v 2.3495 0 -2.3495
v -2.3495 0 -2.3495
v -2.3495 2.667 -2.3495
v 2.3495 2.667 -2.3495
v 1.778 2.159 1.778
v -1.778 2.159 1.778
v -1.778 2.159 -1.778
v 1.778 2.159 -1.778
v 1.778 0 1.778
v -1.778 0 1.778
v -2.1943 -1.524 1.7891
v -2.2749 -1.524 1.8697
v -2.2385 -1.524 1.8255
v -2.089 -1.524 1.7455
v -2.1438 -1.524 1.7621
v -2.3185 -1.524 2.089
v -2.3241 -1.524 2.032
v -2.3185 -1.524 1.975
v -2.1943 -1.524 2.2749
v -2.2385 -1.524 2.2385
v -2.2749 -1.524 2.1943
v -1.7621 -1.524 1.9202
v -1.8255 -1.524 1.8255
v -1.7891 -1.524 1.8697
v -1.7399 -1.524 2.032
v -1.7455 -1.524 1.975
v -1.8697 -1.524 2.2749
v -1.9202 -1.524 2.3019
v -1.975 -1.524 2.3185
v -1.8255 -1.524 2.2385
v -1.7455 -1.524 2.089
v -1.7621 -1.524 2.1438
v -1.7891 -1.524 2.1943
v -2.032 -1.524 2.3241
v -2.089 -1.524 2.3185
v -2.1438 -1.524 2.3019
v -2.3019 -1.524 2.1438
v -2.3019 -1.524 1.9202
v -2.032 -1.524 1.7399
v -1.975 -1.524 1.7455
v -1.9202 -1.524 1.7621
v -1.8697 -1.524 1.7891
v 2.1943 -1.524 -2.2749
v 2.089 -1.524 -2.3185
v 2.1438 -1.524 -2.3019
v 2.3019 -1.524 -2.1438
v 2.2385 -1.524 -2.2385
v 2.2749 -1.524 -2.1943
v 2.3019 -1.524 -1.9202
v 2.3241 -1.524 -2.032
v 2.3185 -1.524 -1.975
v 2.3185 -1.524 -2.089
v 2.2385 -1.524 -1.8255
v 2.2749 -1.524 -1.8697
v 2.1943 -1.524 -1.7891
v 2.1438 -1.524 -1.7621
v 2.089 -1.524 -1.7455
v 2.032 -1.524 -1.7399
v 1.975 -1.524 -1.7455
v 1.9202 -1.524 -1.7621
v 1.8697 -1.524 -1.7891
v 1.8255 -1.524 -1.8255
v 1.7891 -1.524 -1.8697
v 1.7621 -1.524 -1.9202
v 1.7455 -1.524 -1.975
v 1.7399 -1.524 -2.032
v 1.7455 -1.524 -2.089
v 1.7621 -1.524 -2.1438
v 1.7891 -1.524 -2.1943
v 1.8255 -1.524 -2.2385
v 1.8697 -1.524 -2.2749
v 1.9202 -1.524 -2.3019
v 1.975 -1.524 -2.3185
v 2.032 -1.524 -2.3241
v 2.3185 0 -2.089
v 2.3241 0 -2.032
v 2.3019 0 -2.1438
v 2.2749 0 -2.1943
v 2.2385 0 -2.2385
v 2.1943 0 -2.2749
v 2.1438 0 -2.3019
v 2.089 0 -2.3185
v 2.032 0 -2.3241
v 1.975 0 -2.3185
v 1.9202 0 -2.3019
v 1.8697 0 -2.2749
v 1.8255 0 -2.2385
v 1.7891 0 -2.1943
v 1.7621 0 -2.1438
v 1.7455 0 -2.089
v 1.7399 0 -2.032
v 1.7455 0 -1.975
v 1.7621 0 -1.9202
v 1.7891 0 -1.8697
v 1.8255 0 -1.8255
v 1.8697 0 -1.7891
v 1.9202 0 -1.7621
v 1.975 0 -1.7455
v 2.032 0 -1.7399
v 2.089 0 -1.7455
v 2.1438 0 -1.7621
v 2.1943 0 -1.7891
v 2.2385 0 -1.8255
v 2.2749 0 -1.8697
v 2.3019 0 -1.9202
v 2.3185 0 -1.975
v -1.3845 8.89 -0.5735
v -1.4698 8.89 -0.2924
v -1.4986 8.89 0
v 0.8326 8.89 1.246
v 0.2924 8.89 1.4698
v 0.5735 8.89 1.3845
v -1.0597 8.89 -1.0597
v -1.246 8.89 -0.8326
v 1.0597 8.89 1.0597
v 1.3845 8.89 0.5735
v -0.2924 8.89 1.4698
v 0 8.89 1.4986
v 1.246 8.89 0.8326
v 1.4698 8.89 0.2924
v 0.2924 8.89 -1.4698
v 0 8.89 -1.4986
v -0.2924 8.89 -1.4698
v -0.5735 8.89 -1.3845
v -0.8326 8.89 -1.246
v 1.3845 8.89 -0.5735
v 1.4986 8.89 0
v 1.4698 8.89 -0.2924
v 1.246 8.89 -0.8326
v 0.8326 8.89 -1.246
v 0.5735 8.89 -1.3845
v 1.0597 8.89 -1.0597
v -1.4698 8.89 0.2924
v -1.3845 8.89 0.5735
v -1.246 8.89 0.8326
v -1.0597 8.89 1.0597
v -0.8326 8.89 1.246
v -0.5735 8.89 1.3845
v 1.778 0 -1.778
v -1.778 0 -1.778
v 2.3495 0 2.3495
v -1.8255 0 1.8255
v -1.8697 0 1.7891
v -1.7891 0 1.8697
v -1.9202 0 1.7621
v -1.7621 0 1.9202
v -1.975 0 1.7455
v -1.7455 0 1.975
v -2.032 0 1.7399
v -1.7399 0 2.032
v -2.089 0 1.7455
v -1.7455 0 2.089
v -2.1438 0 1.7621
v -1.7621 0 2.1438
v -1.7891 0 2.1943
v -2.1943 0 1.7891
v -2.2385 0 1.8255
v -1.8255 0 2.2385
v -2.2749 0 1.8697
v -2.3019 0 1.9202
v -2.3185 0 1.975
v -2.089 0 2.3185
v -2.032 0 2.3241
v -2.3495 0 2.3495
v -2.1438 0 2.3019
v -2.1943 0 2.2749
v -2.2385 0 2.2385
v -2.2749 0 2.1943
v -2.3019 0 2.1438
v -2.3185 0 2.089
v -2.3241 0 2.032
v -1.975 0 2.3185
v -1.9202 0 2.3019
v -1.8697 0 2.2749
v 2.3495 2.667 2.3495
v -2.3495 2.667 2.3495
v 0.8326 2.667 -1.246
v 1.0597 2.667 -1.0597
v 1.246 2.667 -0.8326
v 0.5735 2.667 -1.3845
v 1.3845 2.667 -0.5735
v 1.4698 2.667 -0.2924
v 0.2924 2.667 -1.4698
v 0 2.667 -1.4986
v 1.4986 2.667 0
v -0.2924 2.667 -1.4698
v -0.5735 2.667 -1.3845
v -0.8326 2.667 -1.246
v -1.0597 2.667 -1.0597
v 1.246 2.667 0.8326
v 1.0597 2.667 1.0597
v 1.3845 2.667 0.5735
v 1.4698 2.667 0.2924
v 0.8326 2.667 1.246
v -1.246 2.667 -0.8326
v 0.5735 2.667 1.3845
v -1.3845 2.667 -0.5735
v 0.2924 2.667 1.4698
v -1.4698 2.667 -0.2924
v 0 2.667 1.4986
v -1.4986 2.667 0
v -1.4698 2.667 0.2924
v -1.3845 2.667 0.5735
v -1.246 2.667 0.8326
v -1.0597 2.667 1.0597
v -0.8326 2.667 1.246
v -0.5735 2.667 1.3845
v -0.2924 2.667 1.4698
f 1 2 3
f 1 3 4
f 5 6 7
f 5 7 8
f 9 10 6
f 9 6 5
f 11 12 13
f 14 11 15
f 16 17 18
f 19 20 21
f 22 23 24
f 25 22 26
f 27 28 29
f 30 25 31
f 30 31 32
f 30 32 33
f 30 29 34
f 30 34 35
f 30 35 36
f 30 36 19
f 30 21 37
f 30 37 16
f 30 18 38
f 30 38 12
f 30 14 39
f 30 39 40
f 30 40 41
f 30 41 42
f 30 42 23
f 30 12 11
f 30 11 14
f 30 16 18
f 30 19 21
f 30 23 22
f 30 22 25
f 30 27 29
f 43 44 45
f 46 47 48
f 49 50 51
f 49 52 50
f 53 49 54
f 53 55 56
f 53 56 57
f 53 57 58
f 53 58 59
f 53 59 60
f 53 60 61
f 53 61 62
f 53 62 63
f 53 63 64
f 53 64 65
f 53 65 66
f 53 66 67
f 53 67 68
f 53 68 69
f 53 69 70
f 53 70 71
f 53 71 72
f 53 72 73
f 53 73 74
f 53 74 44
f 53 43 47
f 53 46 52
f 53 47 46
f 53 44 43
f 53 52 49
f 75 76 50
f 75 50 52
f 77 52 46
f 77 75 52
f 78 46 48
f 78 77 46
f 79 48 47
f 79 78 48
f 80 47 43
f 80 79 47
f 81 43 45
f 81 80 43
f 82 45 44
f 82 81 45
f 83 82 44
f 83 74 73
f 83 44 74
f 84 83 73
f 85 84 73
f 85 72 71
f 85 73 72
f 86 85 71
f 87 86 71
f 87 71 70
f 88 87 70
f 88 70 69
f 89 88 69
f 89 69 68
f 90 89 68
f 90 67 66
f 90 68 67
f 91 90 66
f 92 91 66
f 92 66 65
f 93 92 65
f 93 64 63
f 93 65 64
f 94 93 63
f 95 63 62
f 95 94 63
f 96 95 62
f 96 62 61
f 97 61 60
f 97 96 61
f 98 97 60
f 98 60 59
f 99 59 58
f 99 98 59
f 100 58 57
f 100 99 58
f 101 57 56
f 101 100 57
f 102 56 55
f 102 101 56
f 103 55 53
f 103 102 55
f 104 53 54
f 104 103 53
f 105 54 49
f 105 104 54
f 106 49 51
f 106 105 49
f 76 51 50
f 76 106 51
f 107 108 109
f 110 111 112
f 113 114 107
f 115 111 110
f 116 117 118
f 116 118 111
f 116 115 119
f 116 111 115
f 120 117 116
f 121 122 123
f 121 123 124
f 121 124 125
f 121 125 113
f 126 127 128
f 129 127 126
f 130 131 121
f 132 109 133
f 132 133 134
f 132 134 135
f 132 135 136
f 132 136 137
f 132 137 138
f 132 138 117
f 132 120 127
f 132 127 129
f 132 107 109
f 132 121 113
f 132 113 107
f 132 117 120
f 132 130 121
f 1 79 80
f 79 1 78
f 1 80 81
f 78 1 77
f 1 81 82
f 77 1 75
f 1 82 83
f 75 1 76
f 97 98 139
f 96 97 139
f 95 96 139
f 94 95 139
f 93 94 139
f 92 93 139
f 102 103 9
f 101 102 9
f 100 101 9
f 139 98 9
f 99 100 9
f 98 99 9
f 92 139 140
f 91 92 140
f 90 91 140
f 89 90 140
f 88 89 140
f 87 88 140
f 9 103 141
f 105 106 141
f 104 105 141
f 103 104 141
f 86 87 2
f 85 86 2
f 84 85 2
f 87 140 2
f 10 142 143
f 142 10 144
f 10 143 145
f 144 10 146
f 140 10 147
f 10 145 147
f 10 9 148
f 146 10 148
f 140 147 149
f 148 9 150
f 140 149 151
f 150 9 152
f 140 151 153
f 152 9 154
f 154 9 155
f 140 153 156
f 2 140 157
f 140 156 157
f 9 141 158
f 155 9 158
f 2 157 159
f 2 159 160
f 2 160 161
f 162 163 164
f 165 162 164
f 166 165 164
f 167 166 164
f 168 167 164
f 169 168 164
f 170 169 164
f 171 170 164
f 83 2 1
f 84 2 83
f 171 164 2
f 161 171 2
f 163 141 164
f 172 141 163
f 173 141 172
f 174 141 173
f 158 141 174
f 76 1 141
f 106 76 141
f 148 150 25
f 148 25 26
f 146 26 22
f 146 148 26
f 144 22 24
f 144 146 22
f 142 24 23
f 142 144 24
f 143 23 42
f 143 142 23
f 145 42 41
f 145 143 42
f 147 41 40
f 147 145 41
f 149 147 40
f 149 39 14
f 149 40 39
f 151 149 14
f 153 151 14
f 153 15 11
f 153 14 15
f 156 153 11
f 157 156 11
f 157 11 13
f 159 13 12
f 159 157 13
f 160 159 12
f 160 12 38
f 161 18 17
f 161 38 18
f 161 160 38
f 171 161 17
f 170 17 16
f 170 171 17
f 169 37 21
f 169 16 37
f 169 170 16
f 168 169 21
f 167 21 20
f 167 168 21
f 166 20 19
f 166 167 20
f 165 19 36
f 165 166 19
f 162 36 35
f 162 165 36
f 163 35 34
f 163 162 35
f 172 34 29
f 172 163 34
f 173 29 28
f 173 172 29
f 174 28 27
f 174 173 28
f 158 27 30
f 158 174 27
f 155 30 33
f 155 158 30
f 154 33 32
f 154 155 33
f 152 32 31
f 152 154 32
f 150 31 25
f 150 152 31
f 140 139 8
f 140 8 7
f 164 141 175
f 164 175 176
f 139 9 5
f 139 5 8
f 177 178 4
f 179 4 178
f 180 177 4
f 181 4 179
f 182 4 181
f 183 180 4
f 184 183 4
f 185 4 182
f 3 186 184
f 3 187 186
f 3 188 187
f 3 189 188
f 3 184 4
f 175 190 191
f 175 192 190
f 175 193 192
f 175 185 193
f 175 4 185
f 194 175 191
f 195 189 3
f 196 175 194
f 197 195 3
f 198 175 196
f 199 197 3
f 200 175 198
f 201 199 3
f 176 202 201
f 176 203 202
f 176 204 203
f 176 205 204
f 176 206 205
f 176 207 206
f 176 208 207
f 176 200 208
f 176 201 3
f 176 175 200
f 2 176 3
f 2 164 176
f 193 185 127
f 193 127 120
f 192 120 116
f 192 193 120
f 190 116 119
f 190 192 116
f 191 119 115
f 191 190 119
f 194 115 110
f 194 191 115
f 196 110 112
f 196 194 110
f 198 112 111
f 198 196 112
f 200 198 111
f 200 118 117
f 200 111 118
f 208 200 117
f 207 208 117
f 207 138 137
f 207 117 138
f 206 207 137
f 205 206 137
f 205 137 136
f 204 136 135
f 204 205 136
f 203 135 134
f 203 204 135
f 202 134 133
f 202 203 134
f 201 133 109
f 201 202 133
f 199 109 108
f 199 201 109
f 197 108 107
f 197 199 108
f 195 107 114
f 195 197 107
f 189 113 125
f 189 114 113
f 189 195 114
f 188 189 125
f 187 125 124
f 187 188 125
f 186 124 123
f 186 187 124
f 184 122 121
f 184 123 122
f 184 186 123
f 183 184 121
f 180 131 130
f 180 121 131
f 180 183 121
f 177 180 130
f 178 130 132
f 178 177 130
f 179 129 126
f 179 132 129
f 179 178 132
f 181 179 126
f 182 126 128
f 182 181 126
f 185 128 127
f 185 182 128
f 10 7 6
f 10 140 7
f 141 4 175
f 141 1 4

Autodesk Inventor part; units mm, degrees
ref_plane "YZ Plane" through (0, 0, 0) normal (1, 0, 0) x (0, 1, 0)
ref_plane "XZ Plane" through (0, 0, 0) normal (0, 1, 0) x (-1, 0, 0)
ref_plane "XY Plane" through (0, 0, 0) normal (0, 0, 1) x (1, 0, 0)
sketch "Sketch1" plane through (0, 0, 0) normal (0, 1, 0) x (-1, 0, 0)
  line L0 (-2.3495, 2.3495) -> (2.3495, 2.3495)
  line L1 (2.3495, 2.3495) -> (2.3495, -2.3495)
  line L2 (2.3495, -2.3495) -> (-2.3495, -2.3495)
  line L3 (-2.3495, -2.3495) -> (-2.3495, 2.3495)
  line L4 (-2.3495, 2.3495) -> (2.3495, -2.3495) construction
  line L5 (2.3495, 2.3495) -> (-2.3495, -2.3495) construction
  point P0 (0, 0)
  dimension "d0" = 4.699
  dimension "width" = 4.699
extrude "Extrusion1" add sketch "Sketch1" along normal blind 2.667
sketch "Sketch2" plane through (0, 2.667, 0) normal (0, 1, 0) x (1, 0, 0)
  circle A0 centre (0, 0) radius 1.4986
  dimension "d4" = 2.9972
extrude "Extrusion2" add sketch "Sketch2" along normal blind 6.223
sketch "Sketch3" plane through (0, 0, 0) normal (0, -1, 0) x (1, 0, 0)
  line L0 (-1.778, 1.778) -> (1.778, 1.778)
  line L1 (1.778, 1.778) -> (1.778, -1.778)
  line L2 (1.778, -1.778) -> (-1.778, -1.778)
  line L3 (-1.778, -1.778) -> (-1.778, 1.778)
  line L4 (-1.778, 1.778) -> (1.778, -1.778) construction
  line L5 (1.778, 1.778) -> (-1.778, -1.778) construction
  point P0 (0, 0)
  dimension "d7" = 3.556
  dimension "d8" = 3.556
extrude "Extrusion3" cut sketch "Sketch3" against normal blind 2.159
sketch "Sketch4" plane through (0, 0, 0) normal (0, -1, 0) x (1, 0, 0)
  circle A0 centre (-2.032, 2.032) radius 0.2921
  circle A1 centre (2.032, -2.032) radius 0.2921
  point P0 (0, 0)
  point P1 (0, 0)
  dimension "d11" = 0.5842
  dimension "d12" = 2.032
  dimension "d13" = 2.032
  dimension "d16" = 360
extrude "Extrusion4" add sketch "Sketch4" along normal blind 1.524
equation "\"d0\" = width"
properties part number "VLP-350-F" material "Polycarbonate, Clear"
